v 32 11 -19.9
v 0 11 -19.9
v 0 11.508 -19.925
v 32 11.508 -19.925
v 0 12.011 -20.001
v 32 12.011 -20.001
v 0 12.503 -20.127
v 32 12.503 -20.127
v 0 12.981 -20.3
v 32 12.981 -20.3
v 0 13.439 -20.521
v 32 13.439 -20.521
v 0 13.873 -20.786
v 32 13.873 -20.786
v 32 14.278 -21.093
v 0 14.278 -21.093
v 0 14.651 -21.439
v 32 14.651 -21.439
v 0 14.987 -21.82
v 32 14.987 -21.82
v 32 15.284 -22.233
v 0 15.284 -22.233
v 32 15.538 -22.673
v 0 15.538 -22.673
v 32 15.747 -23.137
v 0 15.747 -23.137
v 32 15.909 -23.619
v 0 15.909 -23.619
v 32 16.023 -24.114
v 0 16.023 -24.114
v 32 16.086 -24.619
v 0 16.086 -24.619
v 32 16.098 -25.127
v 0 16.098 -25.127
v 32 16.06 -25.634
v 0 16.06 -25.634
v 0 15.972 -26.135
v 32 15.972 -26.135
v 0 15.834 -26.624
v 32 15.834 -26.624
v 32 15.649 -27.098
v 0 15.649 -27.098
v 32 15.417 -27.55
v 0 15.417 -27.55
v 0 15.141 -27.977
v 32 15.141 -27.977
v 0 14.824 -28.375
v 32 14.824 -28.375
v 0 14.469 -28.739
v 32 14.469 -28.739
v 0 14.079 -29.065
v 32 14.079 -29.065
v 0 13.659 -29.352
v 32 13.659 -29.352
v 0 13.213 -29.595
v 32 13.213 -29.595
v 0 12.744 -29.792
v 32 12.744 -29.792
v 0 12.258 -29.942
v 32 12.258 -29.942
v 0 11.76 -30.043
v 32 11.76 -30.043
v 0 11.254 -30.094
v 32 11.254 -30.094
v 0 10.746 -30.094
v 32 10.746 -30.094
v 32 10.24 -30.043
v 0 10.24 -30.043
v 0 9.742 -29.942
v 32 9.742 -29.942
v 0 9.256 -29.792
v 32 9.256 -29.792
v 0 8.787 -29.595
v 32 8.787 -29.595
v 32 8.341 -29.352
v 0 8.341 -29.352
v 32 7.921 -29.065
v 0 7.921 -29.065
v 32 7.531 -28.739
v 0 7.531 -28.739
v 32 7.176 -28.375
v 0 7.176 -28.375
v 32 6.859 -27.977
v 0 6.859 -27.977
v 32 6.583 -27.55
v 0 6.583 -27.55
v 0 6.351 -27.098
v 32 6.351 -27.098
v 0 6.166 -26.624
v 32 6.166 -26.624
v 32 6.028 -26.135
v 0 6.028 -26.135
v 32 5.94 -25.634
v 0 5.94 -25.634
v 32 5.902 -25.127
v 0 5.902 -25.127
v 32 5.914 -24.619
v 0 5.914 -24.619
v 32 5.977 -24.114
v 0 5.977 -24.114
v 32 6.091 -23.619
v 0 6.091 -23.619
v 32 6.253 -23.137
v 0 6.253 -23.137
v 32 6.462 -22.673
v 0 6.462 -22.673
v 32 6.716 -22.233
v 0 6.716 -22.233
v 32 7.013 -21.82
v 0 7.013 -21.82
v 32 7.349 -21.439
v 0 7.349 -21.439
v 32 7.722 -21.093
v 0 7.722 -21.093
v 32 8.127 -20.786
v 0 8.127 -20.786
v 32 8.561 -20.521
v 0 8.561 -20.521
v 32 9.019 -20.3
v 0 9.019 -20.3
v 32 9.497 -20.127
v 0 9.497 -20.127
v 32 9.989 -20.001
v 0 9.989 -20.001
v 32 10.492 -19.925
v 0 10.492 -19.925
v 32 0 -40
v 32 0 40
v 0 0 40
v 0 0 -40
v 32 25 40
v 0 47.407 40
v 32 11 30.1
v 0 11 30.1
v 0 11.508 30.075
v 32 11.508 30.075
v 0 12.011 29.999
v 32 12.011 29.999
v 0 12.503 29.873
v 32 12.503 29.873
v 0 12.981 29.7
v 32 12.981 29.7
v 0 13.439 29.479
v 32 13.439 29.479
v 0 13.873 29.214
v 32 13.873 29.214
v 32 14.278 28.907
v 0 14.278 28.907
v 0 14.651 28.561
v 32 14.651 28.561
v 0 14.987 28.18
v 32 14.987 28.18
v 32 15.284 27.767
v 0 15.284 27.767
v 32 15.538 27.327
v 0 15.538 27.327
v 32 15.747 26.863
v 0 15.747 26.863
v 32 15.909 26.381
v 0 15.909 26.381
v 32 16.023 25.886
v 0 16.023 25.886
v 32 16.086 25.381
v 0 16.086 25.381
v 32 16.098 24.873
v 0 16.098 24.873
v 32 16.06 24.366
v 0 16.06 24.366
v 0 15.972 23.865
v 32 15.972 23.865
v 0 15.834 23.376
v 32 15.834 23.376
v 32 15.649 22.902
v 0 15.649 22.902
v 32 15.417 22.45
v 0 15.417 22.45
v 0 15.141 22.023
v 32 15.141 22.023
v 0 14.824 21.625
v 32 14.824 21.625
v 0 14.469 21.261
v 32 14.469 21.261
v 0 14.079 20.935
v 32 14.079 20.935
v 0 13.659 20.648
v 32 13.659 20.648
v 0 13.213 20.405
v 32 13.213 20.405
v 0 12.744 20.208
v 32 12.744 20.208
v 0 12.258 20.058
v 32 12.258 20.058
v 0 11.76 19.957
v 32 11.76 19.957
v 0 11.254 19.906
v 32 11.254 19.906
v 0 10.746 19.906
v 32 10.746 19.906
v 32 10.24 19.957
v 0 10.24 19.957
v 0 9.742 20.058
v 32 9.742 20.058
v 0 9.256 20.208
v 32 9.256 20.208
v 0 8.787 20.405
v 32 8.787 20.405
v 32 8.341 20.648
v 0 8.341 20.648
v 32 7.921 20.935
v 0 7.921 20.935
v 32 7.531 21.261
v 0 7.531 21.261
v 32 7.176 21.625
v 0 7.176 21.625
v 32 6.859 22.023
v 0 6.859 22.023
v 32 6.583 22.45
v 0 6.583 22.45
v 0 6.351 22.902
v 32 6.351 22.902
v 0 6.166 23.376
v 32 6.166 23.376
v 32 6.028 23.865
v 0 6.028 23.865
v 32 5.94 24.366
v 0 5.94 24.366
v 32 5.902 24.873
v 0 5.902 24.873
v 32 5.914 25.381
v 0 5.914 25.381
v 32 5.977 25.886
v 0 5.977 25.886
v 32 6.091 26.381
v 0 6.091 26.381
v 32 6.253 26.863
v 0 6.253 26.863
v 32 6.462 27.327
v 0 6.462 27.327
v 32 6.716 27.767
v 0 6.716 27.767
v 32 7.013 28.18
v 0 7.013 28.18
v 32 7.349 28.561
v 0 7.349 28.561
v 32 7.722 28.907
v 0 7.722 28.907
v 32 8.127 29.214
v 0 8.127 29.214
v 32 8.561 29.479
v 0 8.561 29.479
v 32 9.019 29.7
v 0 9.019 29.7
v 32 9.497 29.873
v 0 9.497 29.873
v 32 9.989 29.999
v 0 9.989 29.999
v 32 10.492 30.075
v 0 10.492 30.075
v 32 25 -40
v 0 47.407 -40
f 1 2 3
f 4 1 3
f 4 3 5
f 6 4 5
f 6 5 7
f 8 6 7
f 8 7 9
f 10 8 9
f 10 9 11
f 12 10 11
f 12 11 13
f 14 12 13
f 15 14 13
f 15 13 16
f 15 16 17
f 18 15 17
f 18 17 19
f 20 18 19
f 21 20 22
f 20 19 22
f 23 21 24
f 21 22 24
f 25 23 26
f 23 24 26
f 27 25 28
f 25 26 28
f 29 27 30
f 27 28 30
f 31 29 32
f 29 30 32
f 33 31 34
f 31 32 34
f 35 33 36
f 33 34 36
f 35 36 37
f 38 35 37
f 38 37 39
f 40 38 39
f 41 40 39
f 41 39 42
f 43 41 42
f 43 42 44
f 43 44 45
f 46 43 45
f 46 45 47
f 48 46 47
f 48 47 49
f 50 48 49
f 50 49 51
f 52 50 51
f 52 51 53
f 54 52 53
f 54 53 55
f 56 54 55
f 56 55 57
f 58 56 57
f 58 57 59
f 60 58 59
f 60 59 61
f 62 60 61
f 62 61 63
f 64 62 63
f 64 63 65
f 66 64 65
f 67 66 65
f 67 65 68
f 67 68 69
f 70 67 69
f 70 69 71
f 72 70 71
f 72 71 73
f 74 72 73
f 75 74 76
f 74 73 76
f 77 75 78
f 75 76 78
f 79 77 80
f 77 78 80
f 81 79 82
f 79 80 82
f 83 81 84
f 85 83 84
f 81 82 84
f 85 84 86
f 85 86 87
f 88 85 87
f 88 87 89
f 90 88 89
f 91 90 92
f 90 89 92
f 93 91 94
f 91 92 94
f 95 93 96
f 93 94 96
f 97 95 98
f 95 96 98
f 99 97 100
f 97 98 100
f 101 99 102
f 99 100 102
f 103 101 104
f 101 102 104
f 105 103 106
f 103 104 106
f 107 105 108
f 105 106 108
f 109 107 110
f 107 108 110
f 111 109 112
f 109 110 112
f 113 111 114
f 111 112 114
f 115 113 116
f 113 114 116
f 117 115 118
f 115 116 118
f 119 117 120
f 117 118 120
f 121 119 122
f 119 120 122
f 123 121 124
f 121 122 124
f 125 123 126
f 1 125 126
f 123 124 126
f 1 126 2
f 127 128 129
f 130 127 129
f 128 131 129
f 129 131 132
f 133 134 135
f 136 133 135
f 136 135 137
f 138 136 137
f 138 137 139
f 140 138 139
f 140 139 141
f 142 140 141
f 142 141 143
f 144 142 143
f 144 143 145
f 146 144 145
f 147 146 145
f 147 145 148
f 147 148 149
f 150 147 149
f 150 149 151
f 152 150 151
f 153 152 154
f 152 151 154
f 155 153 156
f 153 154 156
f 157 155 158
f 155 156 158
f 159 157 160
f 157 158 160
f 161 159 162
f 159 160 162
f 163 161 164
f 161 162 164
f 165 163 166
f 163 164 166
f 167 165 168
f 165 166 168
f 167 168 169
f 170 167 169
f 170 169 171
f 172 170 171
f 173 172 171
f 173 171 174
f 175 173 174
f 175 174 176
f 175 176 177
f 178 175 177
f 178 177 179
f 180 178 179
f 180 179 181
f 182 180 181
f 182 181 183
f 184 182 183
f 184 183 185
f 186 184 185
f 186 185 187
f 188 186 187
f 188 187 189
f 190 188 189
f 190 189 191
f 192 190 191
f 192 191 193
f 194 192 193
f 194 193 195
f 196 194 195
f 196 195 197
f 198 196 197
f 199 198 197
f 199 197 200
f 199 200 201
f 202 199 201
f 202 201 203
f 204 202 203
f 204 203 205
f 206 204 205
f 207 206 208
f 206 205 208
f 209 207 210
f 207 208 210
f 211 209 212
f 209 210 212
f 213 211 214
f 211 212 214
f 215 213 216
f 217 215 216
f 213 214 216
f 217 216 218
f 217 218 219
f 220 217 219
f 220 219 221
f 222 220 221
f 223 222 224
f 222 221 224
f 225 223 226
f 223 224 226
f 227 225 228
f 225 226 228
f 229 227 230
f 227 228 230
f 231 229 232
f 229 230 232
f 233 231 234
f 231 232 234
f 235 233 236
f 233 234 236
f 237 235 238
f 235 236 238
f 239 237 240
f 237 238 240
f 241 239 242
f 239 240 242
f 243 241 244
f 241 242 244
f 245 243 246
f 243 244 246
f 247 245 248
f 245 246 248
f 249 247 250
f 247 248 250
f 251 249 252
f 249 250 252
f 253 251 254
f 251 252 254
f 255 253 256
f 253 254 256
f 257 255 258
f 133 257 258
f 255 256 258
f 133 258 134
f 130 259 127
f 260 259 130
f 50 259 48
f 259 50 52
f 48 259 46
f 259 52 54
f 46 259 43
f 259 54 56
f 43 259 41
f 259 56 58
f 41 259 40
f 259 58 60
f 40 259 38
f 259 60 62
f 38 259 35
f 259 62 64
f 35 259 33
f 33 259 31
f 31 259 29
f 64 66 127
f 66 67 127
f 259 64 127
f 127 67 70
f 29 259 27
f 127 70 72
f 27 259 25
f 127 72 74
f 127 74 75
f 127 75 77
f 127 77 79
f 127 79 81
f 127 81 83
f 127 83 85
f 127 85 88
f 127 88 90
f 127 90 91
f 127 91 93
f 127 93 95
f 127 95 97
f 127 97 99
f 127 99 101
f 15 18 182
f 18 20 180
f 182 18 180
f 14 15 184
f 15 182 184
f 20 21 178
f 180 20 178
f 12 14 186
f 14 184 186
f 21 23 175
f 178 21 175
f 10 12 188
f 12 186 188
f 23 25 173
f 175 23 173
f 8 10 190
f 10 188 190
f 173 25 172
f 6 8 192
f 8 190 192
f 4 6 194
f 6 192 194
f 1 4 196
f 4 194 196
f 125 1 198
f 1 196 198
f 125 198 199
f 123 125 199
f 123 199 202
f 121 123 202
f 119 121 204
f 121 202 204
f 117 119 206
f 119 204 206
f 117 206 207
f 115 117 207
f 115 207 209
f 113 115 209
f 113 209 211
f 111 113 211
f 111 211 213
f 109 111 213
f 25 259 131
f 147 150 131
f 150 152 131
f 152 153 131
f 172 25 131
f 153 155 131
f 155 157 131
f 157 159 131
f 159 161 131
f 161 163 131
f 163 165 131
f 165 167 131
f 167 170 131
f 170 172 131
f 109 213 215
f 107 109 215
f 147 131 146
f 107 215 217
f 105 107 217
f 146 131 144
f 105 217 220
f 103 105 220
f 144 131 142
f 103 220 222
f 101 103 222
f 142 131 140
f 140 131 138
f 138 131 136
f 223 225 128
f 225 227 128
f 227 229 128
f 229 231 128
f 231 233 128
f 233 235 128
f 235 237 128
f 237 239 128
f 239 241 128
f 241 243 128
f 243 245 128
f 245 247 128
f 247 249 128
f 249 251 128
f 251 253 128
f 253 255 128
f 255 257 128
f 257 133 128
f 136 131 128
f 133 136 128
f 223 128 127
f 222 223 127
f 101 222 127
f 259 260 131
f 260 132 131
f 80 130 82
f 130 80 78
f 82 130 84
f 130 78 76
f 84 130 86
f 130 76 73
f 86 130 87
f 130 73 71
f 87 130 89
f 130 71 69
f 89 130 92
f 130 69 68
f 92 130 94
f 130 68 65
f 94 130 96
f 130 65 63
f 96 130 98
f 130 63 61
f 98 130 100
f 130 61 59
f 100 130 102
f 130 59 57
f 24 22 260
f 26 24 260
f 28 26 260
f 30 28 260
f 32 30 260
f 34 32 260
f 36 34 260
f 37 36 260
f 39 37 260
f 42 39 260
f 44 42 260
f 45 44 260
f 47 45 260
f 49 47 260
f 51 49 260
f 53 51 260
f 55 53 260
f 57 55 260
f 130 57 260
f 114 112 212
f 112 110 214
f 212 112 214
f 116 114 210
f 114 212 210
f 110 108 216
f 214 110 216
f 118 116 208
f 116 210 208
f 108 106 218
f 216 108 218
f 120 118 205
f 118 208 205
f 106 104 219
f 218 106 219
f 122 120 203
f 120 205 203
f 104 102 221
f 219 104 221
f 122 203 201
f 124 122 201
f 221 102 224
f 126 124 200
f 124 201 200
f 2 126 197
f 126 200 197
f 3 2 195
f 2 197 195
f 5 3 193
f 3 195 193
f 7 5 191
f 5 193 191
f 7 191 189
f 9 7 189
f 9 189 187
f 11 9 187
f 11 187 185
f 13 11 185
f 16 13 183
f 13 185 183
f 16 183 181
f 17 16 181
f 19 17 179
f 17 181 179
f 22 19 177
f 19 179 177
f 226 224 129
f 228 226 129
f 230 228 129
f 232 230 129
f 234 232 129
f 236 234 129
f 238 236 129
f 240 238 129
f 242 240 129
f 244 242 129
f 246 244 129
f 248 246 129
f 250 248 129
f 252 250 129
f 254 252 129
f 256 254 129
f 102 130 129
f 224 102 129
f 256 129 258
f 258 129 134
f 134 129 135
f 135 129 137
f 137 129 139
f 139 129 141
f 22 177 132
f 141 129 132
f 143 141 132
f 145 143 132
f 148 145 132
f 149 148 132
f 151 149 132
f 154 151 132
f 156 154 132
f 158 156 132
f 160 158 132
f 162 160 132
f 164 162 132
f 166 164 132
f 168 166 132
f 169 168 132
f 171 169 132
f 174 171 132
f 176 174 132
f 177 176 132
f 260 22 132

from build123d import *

# Parameters (mm, degrees)
EXTRUDE_1_DEPTH     = 40
HOLE_WIZARD_M12_1_D = 10.2


with BuildPart() as part:
    # 草图1 → 凸台-拉伸1 (new, symmetric)
    with BuildSketch(Plane.XY):
        Polygon((0, 0), (0, 47.406641223), (32, 25), (32, 0), align=None)
    extrude(amount=EXTRUDE_1_DEPTH, both=True)

    # M12 螺纹孔1 (through all)
    with Locations(Plane(origin=(32, 0, 0), x_dir=(0, 0, -1), z_dir=(1, 0, 0))):
        with Locations((-25, 11), (25, 11)):
            Hole(HOLE_WIZARD_M12_1_D / 2)


solid = part.part
